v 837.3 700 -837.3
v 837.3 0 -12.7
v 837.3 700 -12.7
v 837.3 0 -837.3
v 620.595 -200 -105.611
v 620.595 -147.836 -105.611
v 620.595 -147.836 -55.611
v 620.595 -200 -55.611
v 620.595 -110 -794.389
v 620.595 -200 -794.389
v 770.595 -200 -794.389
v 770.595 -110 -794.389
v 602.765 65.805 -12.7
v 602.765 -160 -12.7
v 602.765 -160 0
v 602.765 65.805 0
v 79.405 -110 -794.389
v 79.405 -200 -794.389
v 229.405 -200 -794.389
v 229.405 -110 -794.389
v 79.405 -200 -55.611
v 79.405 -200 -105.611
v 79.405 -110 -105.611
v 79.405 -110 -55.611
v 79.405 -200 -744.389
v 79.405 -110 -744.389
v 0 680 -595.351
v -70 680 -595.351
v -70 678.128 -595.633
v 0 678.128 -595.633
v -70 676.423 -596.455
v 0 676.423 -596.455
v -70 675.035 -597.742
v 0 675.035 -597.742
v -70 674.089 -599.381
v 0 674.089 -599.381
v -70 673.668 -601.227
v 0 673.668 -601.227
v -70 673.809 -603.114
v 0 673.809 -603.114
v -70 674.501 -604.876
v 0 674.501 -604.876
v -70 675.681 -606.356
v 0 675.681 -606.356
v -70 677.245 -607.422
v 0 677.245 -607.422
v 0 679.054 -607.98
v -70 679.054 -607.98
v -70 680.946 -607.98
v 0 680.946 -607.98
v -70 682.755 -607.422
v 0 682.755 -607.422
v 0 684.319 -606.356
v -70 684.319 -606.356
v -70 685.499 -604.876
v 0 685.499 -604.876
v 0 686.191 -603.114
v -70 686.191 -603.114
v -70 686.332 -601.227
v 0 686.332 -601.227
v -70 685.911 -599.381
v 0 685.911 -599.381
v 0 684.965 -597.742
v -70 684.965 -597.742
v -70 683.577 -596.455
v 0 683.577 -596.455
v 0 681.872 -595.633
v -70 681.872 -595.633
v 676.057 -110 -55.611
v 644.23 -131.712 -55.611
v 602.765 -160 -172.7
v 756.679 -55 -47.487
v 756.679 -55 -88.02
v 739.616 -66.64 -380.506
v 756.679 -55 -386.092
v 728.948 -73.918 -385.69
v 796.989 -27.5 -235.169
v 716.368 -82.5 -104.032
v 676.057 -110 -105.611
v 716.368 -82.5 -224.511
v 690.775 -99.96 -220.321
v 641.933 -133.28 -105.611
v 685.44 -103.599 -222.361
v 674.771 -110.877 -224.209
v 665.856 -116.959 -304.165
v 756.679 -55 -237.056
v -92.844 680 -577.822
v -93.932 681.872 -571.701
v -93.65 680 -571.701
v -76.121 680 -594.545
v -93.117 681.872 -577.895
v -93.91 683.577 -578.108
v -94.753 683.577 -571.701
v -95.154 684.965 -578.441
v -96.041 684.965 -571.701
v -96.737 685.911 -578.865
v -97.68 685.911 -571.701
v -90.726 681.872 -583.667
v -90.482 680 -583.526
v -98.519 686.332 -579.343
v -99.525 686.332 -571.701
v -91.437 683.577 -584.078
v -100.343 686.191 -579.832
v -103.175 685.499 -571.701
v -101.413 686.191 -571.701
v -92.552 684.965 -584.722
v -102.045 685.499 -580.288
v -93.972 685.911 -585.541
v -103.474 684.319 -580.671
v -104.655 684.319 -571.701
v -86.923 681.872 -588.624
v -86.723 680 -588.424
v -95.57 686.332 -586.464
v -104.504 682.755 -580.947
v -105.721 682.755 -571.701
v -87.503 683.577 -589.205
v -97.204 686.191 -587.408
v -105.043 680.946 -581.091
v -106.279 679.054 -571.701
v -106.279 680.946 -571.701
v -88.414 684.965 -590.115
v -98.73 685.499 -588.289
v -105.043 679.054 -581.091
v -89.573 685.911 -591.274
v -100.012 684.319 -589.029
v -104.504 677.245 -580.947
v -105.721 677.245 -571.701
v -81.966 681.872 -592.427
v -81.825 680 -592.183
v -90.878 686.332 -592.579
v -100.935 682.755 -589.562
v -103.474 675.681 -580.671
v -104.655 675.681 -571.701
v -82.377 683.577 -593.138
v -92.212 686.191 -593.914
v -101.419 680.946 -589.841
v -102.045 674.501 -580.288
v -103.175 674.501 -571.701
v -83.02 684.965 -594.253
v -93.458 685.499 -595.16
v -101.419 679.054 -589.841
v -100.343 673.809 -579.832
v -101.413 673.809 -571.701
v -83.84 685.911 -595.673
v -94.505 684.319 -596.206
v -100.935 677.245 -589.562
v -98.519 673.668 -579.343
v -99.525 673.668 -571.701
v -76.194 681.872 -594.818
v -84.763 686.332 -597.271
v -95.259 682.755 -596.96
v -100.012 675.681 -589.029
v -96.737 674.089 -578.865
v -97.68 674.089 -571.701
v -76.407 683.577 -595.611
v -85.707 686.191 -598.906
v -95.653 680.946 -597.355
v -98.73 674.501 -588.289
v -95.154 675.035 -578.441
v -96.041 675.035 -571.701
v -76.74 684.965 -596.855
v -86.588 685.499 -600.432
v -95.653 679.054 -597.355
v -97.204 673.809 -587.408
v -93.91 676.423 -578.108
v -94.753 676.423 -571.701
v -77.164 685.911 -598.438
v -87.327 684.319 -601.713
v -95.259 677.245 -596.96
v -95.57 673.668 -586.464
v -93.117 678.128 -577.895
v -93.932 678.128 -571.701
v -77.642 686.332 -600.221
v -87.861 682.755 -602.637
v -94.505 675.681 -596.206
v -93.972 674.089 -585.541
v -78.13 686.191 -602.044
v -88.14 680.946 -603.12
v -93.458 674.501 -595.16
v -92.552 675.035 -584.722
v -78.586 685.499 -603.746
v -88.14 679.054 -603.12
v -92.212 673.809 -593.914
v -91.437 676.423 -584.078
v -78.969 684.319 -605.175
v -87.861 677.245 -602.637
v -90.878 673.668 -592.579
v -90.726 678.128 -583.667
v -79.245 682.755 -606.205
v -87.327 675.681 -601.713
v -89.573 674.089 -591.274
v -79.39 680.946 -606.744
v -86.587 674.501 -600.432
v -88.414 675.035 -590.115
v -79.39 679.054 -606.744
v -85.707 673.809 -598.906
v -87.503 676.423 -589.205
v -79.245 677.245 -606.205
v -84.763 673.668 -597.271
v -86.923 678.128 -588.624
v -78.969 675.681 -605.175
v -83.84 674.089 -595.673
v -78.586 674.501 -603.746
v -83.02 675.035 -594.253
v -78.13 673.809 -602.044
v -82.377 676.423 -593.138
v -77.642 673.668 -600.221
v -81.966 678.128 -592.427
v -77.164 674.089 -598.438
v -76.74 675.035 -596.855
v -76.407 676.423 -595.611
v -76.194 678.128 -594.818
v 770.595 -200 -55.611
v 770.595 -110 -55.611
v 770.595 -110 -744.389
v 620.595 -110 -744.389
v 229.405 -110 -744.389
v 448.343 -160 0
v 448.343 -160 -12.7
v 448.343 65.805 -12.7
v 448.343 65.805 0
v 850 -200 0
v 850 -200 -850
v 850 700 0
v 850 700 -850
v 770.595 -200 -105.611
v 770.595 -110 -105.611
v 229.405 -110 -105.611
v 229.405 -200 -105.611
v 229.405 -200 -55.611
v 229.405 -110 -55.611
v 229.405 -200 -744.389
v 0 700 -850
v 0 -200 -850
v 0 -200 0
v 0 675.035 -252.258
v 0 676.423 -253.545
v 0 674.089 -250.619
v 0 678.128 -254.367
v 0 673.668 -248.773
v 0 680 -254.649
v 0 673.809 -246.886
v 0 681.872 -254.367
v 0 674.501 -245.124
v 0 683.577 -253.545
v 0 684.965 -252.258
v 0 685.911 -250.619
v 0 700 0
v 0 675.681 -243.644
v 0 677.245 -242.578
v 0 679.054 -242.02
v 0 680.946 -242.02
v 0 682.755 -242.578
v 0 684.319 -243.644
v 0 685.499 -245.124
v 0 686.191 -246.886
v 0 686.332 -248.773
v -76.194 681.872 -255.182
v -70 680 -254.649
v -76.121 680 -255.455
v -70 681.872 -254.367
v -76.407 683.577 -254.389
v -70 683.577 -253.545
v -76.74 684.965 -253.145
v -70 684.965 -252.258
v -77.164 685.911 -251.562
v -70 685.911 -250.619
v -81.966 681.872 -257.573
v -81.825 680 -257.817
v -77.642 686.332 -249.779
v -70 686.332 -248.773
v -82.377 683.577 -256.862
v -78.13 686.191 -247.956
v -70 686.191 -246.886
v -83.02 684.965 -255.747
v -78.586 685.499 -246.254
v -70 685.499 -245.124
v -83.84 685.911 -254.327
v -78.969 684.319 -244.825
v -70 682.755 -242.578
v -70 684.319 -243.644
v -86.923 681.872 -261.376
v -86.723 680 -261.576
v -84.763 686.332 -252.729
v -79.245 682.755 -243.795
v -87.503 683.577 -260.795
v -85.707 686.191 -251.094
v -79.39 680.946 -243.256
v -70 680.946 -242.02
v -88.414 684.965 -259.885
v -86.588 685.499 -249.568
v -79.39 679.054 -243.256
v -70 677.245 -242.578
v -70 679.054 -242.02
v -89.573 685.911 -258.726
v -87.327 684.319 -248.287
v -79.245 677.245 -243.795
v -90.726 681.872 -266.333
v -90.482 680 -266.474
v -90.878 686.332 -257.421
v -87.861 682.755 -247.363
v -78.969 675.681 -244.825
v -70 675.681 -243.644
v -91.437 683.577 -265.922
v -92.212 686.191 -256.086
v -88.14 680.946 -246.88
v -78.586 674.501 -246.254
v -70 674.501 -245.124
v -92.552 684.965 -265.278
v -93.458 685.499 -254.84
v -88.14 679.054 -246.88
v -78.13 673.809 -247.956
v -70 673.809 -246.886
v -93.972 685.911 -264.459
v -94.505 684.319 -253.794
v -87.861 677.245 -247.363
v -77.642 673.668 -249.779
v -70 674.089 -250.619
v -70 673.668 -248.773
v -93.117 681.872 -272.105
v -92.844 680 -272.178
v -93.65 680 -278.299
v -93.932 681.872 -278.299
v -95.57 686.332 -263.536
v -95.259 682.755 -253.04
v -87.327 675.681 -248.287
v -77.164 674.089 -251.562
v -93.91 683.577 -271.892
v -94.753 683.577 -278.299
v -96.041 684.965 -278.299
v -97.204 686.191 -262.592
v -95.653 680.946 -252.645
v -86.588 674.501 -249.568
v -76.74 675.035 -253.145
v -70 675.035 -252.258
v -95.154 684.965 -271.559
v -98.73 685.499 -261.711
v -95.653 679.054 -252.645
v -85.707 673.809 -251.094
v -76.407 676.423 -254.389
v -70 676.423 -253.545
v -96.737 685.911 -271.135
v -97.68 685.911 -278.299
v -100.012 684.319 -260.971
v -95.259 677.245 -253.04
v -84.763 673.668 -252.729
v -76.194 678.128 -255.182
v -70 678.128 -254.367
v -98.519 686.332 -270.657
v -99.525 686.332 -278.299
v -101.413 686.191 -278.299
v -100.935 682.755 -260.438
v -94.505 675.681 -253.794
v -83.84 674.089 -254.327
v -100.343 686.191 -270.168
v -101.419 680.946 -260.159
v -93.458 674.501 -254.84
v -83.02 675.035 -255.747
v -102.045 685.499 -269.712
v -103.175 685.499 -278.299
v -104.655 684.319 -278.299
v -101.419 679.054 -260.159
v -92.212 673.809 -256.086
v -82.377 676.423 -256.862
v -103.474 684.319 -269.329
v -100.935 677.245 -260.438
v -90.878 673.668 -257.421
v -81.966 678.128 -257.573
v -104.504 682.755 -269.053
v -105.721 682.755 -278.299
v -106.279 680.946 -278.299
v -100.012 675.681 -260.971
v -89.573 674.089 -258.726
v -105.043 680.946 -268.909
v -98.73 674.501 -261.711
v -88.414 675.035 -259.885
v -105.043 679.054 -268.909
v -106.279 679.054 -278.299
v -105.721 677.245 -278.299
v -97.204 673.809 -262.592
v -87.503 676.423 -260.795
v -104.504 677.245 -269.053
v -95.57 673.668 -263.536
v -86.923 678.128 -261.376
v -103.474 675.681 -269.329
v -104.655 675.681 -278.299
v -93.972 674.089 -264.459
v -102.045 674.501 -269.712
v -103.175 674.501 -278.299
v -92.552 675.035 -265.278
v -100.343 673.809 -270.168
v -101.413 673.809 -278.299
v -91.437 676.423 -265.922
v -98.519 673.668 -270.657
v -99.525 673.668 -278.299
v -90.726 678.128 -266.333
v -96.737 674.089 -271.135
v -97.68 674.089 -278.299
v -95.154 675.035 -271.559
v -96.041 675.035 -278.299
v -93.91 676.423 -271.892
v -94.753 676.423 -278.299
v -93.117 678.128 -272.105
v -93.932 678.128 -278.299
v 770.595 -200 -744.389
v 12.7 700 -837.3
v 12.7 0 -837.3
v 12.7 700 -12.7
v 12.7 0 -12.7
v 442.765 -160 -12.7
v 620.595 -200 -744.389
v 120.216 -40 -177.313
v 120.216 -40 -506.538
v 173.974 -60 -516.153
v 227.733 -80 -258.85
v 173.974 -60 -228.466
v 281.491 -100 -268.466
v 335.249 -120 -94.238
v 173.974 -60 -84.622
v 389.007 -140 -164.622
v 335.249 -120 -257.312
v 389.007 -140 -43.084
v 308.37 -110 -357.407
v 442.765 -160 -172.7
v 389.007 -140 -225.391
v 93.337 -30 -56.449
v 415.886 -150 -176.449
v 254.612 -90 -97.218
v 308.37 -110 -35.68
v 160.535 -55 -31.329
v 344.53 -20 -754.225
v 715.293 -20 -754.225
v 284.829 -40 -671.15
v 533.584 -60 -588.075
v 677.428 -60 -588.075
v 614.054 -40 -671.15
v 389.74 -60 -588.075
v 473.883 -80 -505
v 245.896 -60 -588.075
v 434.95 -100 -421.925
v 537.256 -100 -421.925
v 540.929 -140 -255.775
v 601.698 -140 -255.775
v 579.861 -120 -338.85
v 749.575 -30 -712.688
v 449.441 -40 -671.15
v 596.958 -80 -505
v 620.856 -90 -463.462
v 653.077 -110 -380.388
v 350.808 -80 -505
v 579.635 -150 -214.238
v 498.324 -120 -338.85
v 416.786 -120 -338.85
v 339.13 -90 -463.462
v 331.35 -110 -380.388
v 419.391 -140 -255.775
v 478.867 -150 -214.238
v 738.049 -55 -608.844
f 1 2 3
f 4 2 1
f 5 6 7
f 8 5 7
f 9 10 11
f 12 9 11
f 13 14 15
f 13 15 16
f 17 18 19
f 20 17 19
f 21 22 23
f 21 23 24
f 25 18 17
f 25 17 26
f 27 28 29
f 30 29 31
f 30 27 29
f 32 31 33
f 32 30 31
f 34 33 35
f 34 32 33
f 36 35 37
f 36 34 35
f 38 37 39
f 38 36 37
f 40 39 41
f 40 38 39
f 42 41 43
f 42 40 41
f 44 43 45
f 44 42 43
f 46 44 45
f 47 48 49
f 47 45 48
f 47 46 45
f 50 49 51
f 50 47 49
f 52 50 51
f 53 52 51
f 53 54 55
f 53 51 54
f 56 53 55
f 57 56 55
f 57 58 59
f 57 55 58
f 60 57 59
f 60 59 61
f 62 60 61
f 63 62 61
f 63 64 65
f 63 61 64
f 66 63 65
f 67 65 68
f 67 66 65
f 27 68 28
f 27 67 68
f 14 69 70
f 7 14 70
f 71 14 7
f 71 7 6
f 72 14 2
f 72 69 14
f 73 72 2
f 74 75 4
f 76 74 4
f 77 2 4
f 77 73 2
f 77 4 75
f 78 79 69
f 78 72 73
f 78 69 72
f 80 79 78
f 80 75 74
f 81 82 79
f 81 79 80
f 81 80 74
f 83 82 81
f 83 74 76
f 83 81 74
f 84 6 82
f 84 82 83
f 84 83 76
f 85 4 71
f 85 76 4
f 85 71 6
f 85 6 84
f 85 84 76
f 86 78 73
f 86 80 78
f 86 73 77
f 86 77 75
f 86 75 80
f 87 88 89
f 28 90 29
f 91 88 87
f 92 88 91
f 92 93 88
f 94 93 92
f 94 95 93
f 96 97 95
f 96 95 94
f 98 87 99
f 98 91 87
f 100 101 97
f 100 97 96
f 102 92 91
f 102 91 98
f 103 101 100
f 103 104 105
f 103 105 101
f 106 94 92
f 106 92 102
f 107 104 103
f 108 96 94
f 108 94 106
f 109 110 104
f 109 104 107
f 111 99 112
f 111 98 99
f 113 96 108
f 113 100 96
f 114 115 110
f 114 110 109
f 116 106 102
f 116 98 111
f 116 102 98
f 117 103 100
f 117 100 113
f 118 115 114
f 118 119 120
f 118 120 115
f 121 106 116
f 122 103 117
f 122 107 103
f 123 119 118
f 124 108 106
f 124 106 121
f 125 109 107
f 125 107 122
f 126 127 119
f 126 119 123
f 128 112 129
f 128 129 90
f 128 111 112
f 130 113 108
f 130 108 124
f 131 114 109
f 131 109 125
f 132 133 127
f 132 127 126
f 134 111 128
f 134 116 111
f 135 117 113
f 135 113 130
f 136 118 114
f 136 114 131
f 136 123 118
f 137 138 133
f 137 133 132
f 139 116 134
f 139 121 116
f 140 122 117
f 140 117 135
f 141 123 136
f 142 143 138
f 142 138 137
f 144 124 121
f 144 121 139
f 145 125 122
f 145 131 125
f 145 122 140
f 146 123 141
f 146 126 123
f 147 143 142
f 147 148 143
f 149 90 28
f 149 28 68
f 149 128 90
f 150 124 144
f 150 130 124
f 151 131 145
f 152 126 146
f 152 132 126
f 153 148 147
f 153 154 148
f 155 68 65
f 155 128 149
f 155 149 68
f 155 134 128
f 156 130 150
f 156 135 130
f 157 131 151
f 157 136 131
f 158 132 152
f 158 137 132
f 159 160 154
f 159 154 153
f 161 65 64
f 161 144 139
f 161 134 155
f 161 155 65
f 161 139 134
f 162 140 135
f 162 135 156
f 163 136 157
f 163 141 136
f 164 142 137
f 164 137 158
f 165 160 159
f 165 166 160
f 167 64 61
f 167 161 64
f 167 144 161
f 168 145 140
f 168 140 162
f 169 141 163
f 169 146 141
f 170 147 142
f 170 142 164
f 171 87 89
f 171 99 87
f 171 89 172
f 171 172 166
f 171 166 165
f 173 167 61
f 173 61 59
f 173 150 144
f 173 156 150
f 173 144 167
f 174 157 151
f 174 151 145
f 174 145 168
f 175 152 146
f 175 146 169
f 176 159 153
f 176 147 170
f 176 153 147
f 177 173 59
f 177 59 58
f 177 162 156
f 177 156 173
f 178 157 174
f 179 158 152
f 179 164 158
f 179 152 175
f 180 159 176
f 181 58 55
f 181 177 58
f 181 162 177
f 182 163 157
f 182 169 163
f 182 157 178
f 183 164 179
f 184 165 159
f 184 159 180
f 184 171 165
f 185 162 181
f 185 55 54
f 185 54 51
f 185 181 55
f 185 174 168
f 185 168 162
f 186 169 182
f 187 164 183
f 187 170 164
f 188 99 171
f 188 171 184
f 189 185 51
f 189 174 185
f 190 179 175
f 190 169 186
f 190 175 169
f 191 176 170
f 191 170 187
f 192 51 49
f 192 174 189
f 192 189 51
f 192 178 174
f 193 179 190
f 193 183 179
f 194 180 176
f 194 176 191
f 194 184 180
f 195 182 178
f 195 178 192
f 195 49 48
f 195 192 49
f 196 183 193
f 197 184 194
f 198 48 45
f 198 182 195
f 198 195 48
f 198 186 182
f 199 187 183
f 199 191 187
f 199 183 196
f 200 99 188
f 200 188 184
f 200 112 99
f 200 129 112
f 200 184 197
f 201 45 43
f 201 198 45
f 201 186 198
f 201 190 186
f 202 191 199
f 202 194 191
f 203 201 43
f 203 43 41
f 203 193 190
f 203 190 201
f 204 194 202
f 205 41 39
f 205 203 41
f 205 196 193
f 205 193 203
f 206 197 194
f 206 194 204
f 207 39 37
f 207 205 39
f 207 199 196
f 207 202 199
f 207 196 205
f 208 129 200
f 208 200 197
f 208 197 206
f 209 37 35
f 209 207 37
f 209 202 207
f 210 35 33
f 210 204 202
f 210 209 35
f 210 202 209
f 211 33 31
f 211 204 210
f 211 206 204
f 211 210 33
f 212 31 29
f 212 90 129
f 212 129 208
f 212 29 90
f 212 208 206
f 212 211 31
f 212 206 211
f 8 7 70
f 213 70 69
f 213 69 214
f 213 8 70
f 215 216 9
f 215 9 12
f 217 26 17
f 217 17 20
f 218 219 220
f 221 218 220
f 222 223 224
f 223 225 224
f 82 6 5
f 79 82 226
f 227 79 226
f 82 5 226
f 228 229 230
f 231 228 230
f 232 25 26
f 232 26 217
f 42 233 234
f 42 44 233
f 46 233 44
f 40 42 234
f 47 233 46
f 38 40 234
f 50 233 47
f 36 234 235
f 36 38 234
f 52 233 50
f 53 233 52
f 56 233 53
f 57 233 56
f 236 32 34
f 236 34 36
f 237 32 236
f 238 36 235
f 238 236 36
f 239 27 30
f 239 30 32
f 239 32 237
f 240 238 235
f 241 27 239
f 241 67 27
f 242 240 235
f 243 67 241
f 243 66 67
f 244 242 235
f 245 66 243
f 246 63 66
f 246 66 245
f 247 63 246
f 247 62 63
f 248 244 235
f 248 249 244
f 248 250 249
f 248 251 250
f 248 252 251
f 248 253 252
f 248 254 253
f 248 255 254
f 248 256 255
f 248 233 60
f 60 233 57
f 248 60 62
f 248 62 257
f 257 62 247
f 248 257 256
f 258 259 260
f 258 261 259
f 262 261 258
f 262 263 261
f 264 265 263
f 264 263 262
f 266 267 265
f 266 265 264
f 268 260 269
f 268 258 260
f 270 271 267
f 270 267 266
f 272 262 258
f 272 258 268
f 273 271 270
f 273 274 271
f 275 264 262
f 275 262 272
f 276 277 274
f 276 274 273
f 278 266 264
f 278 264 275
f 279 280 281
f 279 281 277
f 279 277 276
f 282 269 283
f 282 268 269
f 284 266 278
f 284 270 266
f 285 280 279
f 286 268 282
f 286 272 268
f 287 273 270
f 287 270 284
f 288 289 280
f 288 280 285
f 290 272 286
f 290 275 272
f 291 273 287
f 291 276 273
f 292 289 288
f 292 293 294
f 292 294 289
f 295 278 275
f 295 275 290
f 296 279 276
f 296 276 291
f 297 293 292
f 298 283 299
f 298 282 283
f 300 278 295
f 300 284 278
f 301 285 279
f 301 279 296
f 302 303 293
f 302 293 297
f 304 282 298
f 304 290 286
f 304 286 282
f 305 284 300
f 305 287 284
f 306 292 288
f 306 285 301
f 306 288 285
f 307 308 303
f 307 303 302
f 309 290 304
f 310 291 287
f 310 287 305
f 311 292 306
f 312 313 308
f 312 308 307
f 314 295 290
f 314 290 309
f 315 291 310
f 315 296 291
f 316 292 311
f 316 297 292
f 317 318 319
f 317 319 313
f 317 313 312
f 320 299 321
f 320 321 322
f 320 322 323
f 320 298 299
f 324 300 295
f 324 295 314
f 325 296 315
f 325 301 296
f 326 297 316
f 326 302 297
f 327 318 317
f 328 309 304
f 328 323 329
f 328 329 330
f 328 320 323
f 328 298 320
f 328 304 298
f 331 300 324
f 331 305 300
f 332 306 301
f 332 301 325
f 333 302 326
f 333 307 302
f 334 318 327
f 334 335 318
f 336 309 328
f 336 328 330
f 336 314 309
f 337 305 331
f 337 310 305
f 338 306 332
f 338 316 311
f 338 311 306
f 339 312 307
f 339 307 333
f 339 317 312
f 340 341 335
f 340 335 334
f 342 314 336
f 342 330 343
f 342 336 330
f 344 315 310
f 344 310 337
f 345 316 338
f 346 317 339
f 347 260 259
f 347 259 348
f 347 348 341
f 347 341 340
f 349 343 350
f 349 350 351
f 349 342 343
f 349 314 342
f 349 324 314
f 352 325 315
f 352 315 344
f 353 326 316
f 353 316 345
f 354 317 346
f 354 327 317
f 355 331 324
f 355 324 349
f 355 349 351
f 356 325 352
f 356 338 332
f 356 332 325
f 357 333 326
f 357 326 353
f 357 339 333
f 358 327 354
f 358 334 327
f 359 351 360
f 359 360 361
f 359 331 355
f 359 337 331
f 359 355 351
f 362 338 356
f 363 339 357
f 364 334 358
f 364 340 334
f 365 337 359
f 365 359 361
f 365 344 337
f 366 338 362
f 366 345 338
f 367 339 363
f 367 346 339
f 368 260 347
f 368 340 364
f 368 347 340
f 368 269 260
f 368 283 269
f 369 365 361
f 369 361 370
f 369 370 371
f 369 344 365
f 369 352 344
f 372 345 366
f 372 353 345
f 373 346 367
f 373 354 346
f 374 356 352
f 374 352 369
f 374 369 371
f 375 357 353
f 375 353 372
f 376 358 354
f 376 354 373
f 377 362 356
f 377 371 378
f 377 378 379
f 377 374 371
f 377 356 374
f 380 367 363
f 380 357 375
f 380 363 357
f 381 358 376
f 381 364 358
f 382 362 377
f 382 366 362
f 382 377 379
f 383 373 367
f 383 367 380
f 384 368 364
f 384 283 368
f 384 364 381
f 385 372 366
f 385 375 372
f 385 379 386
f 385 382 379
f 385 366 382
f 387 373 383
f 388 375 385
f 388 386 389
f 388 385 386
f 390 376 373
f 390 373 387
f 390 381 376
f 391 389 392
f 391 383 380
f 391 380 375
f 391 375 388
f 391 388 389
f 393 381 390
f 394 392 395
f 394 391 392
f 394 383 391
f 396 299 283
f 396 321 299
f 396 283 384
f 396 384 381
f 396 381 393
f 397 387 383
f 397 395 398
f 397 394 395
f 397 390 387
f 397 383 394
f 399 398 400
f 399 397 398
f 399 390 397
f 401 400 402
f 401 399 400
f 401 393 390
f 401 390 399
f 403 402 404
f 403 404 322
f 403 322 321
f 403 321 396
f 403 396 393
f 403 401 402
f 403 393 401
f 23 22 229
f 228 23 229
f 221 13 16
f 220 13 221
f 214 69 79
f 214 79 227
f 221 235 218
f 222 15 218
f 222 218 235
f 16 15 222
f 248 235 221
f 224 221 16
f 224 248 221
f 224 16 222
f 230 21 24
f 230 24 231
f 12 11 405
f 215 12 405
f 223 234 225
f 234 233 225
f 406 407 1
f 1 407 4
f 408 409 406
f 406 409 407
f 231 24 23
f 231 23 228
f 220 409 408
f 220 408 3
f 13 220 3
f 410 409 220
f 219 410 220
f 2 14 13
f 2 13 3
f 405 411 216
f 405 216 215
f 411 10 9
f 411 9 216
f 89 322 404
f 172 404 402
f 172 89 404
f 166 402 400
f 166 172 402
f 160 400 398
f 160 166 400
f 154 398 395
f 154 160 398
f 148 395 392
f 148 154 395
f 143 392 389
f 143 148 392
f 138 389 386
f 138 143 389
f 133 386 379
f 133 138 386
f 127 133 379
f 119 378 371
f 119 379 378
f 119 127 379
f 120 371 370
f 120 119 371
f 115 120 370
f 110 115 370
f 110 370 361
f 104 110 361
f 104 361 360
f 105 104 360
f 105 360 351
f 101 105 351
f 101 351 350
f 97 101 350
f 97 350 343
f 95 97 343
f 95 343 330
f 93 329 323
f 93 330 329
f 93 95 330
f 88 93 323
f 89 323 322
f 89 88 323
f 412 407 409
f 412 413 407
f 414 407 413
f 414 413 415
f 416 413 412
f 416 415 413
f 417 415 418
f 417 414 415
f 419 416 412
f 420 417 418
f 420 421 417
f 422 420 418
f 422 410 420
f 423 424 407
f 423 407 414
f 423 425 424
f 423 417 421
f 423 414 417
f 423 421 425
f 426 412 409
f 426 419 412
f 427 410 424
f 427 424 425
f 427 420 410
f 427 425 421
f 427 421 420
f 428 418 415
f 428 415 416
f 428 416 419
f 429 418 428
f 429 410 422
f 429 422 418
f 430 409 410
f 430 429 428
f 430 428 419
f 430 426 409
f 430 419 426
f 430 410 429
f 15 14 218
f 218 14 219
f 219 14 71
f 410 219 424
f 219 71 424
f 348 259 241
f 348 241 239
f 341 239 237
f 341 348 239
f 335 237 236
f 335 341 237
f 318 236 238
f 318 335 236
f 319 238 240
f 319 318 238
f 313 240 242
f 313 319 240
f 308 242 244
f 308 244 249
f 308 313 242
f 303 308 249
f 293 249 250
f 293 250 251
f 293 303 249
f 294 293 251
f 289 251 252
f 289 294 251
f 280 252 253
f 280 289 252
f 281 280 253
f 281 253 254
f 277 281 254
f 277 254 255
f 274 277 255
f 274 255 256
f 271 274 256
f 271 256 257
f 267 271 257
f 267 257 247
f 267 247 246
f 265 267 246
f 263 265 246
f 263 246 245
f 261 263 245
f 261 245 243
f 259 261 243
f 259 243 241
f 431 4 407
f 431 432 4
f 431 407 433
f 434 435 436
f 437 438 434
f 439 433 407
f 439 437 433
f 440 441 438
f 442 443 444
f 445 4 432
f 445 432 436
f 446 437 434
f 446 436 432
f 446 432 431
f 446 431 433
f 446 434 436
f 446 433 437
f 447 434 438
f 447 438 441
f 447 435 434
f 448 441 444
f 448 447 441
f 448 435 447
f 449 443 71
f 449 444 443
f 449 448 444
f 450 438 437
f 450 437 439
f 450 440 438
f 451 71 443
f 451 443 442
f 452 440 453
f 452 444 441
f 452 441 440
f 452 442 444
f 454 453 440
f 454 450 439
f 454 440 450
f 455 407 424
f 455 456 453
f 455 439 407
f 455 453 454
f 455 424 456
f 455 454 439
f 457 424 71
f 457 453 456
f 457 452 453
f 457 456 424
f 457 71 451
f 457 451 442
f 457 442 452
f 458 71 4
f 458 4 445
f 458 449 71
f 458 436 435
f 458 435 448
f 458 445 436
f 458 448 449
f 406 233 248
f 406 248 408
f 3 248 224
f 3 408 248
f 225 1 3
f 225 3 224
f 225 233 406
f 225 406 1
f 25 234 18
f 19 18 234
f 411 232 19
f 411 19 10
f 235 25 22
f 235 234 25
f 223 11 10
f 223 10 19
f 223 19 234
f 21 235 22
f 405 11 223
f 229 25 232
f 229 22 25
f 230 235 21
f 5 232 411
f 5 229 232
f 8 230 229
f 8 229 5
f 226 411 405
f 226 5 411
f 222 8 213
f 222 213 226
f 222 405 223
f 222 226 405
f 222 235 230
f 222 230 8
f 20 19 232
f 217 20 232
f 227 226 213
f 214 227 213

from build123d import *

# Parameters (mm, degrees)
CROQUIS1_W              = 850
CROQUIS1_H              = 850
SALIENTE_EXTRUIR1_DEPTH = 700
VACIADO1_T              = -12.7
CROQUIS2_W              = 850
CROQUIS2_H              = 850
SALIENTE_EXTRUIR2_DEPTH = 200
CROQUIS3_W              = 150
CROQUIS3_H              = 50
CORTAR_EXTRUIR1_DEPTH   = 90
BARRER4_PROFILE_R       = 6.35
CORTAR_EXTRUIR2_REACH   = 1385.319
CROQUIS28_W             = 154.421889756
CROQUIS28_H             = 225.805379595


with BuildPart() as part:
    # Croquis1 → Saliente-Extruir1 (new body)
    with BuildSketch(Plane(origin=(0, 0, 0), x_dir=(1, 0, 0), z_dir=(0, 1, 0))):
        with Locations((425, 425)):
            Rectangle(CROQUIS1_W, CROQUIS1_H)
    extrude(amount=SALIENTE_EXTRUIR1_DEPTH)

    # Vaciado1
    vaciado1_openings = [part.faces().sort_by_distance(p)[0] for p in [
        (425, 700, -425),
        (425, 0, -425),
    ]]
    offset(amount=VACIADO1_T, openings=vaciado1_openings, kind=Kind.INTERSECTION)

    # Croquis2 → Saliente-Extruir2 (add)
    with BuildSketch(Plane.XZ):
        with Locations((425, -425)):
            Rectangle(CROQUIS2_W, CROQUIS2_H)
    extrude(amount=SALIENTE_EXTRUIR2_DEPTH)

    # Croquis3 → Cortar-Extruir1 (cut)
    with BuildSketch(Plane.XZ.offset(200)):
        with Locations((154.404863241, -80.611350772)):
            Rectangle(CROQUIS3_W, CROQUIS3_H)
        with Locations((695.595136759, -80.611350772)):
            Rectangle(CROQUIS3_W, CROQUIS3_H)
        with Locations((154.404863241, -769.388649228)):
            Rectangle(CROQUIS3_W, CROQUIS3_H)
        with Locations((695.595136759, -769.388649228)):
            Rectangle(CROQUIS3_W, CROQUIS3_H)
    extrude(amount=-CORTAR_EXTRUIR1_DEPTH, mode=Mode.SUBTRACT)

    # Croquis8 → Cortar-Recubrir1 section 0
    with BuildSketch(Plane(origin=(0, 0, 0), x_dir=(1, 0, 0), z_dir=(0, 1, 0))):
        with BuildLine():
            Line((12.7, 12.7), (837.3, 12.7))
            Line((837.3, 12.7), (837.3, 837.3))
            Line((837.3, 837.3), (12.7, 837.3))
            Line((12.7, 837.3), (12.7, 12.7))
        make_face()
    # Croquis6 → Cortar-Recubrir1 section 1
    with BuildSketch(Plane(origin=(0, -160, 0), x_dir=(-1, 0, 0), z_dir=(0, -1, 0))):
        with BuildLine():
            Line((-602.765132653, 12.7), (-442.765132653, 12.7))
            Line((-442.765132653, 12.7), (-442.765132653, 172.7))
            Line((-442.765132653, 172.7), (-602.765132653, 172.7))
            Line((-602.765132653, 172.7), (-602.765132653, 12.7))
        make_face()
    loft(mode=Mode.SUBTRACT)

    # Barrer4: sweep along a path in Croquis11
    with BuildLine(Plane(origin=(0, 680, 0), x_dir=(1, 0, 0), z_dir=(0, 1, 0))) as barrer4_path:
        Line((0, 248.298675653), (-70, 248.298675653))
        ThreePointArc((-70, 248.298675653), (-91.213203436, 257.085472217), (-100, 278.298675653))
        Line((-100, 278.298675653), (-100, 571.701324347))
        ThreePointArc((-100, 571.701324347), (-91.213203436, 592.914527783), (-70, 601.701324347))
        Line((-70, 601.701324347), (0, 601.701324347))
    # Barrer4 profile (on start of the path) → Barrer4 (sweep)
    with BuildSketch(Plane(origin=(0, 680, -248.298675653), x_dir=(0, 0, -1), z_dir=(-1, 0, 0))):
        Circle(BARRER4_PROFILE_R)
    sweep(path=barrer4_path.line)

    # Croquis28 → Cortar-Extruir2 (cut, up to next)
    with BuildSketch(Plane(origin=(0, 0, -12.7), x_dir=(-1, 0, 0), z_dir=(0, 0, -1)), mode=Mode.PRIVATE) as cortar_extruir2_sk1:
        with Locations((-525.554187775, -47.097310202)):
            Rectangle(CROQUIS28_W, CROQUIS28_H)
    cortar_extruir2_tool1 = extrude(cortar_extruir2_sk1.sketch, amount=-CORTAR_EXTRUIR2_REACH, mode=Mode.PRIVATE) & part.part
    add(cortar_extruir2_tool1.solids().sort_by_distance((525.554188, -47.09731, -12.7))[0], mode=Mode.SUBTRACT)


solid = part.part
